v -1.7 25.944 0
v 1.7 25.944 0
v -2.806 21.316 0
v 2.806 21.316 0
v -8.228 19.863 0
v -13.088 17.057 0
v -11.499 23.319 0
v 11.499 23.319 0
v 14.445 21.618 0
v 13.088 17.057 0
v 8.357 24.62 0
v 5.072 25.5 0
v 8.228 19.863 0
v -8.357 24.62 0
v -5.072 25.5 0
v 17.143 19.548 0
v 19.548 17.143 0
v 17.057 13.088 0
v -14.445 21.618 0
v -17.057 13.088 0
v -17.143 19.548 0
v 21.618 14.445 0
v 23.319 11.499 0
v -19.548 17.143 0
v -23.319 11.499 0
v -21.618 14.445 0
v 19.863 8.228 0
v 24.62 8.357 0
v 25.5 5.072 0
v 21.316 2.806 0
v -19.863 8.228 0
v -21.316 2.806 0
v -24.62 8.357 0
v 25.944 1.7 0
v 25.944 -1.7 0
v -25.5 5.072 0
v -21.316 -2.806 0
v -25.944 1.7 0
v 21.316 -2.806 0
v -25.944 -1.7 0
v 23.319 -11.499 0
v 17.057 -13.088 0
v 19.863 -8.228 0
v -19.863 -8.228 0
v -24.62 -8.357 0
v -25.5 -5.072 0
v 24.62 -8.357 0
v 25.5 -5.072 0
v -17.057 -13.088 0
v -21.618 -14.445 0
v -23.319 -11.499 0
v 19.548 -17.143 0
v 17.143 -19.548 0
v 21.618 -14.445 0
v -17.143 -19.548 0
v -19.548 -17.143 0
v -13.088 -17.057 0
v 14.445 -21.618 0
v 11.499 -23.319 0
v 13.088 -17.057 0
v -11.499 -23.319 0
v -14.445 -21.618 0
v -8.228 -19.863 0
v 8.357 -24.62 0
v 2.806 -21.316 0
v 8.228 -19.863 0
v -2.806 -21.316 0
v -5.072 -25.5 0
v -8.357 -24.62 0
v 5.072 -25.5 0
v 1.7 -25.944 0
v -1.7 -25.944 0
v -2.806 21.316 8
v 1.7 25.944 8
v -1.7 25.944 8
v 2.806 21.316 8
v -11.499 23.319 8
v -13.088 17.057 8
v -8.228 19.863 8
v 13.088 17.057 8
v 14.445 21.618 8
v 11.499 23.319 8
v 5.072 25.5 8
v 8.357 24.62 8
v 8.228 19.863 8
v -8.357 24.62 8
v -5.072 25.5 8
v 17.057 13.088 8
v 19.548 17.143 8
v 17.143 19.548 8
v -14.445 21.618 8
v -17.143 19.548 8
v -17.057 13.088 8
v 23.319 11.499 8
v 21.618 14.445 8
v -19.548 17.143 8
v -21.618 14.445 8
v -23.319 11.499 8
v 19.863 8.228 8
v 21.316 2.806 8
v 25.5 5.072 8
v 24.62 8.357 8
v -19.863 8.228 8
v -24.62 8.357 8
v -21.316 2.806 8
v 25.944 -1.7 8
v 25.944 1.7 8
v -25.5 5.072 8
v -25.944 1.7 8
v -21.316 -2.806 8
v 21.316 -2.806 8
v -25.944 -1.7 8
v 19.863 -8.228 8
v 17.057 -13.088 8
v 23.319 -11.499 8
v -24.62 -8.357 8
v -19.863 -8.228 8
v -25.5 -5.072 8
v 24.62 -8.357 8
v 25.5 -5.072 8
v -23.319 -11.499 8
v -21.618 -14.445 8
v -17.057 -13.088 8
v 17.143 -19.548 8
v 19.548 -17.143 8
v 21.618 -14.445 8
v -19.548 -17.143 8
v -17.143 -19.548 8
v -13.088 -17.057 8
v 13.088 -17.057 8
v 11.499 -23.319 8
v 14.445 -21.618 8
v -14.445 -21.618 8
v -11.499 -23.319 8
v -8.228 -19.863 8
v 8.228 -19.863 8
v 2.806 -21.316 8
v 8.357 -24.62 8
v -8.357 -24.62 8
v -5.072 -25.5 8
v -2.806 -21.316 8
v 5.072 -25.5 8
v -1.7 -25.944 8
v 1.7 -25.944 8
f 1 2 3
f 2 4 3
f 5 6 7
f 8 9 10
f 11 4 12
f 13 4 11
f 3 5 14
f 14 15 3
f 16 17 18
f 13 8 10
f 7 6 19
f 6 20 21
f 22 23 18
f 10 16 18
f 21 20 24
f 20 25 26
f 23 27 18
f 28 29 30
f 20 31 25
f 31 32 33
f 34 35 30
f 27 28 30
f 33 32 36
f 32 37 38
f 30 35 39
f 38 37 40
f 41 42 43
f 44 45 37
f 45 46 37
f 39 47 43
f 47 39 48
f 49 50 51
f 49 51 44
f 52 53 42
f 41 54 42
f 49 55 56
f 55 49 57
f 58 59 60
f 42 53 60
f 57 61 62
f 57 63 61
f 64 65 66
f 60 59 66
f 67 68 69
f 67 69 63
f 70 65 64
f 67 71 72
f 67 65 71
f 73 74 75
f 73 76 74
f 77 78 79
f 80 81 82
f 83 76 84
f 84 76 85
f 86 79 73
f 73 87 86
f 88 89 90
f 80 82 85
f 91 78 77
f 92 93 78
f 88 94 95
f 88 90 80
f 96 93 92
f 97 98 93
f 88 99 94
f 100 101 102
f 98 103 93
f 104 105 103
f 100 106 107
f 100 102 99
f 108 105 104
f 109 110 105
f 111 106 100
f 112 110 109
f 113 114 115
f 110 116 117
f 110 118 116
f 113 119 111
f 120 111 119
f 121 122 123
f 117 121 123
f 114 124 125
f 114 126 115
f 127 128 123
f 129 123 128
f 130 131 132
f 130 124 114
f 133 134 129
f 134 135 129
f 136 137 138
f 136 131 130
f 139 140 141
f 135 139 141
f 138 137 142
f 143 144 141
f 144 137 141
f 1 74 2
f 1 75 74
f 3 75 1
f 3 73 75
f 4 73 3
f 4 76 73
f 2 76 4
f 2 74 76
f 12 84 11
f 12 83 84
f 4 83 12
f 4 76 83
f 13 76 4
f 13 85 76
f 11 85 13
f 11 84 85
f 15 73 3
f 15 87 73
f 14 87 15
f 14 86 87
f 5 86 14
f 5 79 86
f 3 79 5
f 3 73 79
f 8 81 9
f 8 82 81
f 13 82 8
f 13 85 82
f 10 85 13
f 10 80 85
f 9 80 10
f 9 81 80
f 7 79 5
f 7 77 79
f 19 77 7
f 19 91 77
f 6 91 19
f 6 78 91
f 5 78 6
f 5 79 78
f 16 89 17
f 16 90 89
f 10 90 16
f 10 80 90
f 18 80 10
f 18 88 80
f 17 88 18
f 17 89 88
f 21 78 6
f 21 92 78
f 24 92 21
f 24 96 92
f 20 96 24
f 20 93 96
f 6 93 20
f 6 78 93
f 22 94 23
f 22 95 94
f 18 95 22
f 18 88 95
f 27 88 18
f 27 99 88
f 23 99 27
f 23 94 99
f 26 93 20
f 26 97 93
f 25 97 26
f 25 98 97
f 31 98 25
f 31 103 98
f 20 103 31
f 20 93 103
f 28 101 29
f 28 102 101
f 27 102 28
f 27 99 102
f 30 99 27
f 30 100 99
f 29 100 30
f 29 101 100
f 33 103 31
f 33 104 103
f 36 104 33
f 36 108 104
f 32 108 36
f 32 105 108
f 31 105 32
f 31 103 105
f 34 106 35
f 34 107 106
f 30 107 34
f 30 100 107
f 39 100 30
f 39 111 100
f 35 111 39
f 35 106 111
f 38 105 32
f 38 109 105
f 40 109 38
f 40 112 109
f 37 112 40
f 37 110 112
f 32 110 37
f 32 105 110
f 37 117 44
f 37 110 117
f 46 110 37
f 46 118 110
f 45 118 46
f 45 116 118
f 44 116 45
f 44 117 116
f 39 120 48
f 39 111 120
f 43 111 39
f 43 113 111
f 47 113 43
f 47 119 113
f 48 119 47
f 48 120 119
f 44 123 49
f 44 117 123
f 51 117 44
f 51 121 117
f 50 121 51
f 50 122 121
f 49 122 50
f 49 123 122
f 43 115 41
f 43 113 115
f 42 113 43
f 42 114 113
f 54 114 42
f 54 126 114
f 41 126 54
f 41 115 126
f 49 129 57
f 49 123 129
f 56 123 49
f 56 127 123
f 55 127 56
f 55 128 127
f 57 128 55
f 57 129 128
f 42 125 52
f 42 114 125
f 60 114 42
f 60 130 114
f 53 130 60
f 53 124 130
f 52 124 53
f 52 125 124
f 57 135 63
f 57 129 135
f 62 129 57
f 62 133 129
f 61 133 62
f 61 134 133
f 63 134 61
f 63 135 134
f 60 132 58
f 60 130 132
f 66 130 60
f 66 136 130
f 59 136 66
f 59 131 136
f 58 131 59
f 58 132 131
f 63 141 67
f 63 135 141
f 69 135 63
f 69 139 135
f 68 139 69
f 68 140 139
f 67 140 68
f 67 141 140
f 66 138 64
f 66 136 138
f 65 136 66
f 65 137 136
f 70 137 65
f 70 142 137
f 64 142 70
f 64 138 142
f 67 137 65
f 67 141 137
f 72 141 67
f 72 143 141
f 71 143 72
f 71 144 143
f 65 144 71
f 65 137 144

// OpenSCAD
// ============================================================
// SPUR GEAR — CLEAN TEMPLATE (arc-based tooth, printable)
// ============================================================
// Naming conventions:
// - snake_case for variables and parameters
// - avoid OpenSCAD reserved words (e.g., DO NOT name a parameter "module")
// - degrees for trig (OpenSCAD sin/cos use degrees)
// - all lengths assumed millimeters
//
// UI metadata for your generator:
// param: teeth=24, modul=2, thickness=8, bore_diam=5, $fn_gear=128
// CALL:(teeth=10, modul=2, thickness=13, bore_diam=18, $fn_gear=14);
gear(teeth=24, modul=2, thickness=8, bore_diam=5, $fn_gear=128);

// --------------------------- Public API ---------------------------
/**
 * gear()
 * @param teeth       : integer >= 6 (fewer can look degenerate with simple teeth)
 * @param modul       : ISO gear module (mm per tooth). NOT named "module" to avoid keyword clash.
 * @param thickness   : extrusion height (mm)
 * @param bore_diam   : center hole (mm)
 * @param $fn_gear    : circle resolution for smoother arcs (overrides $fn locally)
 *
 * Notes:
 * - This is a simple, printable tooth outline using arcs (not true involute). Good for demos.
 * - For realistic loads/meshing, switch to an involute version later.
 */
module gear(teeth=24, modul=2, thickness=8, bore_diam=5, $fn_gear=128)
{
    // ------------ Lightweight argument checks (avoid hard failures) ------------
    valid_teeth     = (teeth >= 6);
    valid_modul     = (modul > 0);
    valid_thickness = (thickness > 0);
    valid_bore      = (bore_diam >= 0);

    // You can flip these to "assert(...)" if you prefer hard stops:
    if (!valid_teeth)     echo("[WARN] teeth should be >= 6 for a clean outline.");
    if (!valid_modul)     echo("[WARN] modul must be > 0.");
    if (!valid_thickness) echo("[WARN] thickness must be > 0.");
    if (!valid_bore)      echo("[WARN] bore_diam must be >= 0.");

    // ------------ Derived geometry (ISO-ish defaults) ------------
    m = modul;
    z = teeth;

    pitch_radius     = 0.5 * m * z;       // r_p
    addendum_radius  = pitch_radius + m;  // r_a
    dedendum_factor  = 1.25;              // common approximation
    root_radius_raw  = pitch_radius - dedendum_factor * m;
    root_radius      = (root_radius_raw < 0.1) ? 0.1 : root_radius_raw; // avoid negatives

    // Tooth angular half-width at pitch circle (degrees).
    // This arc-based tooth centers a wedge around the tooth centerline.
    half_tooth_deg   = 180 / z;

    // local resolution for smooth circles
    gear_fn = $fn_gear;

    // ------------ Build 3D ------------
    // Use local $fn inside scope (OpenSCAD respects lexical $fn)
    // 'difference' to subtract the bore
    // linear_extrude is centered at z=0..thickness
    $fn = gear_fn;
    linear_extrude(height = thickness)
        difference() {
            gear_2d(z, pitch_radius, addendum_radius, root_radius, half_tooth_deg);
            if (bore_diam > 0)
                circle(d = bore_diam);
        }
}

// --------------------------- Internal: 2D outline ---------------------------
/**
 * gear_2d()
 * Builds a 2D gear via repeated single-tooth wedges around the origin.
 */
module gear_2d(teeth_count, pitch_radius, addendum_radius, root_radius, half_tooth_deg)
{
    tooth_step_deg = 360 / teeth_count;
    union() {
        for (i = [0 : teeth_count - 1])
            rotate(i * tooth_step_deg)
                single_tooth(addendum_radius, root_radius, half_tooth_deg);
    }
}

/**
 * single_tooth()
 * Simple wedge-like tooth made of four arc points.
 * NOTE: This is an approximation (not a true involute).
 */
module single_tooth(addendum_radius, root_radius, half_angle_deg)
{
    // Four key points: root−, tip−, tip+, root+
    pts = [
        [ root_radius * cos(-half_angle_deg),     root_radius * sin(-half_angle_deg)     ],
        [ addendum_radius * cos(-half_angle_deg/2), addendum_radius * sin(-half_angle_deg/2) ],
        [ addendum_radius * cos( half_angle_deg/2), addendum_radius * sin( half_angle_deg/2) ],
        [ root_radius * cos( half_angle_deg),     root_radius * sin( half_angle_deg)     ]
    ];
    polygon(points = pts);
}
